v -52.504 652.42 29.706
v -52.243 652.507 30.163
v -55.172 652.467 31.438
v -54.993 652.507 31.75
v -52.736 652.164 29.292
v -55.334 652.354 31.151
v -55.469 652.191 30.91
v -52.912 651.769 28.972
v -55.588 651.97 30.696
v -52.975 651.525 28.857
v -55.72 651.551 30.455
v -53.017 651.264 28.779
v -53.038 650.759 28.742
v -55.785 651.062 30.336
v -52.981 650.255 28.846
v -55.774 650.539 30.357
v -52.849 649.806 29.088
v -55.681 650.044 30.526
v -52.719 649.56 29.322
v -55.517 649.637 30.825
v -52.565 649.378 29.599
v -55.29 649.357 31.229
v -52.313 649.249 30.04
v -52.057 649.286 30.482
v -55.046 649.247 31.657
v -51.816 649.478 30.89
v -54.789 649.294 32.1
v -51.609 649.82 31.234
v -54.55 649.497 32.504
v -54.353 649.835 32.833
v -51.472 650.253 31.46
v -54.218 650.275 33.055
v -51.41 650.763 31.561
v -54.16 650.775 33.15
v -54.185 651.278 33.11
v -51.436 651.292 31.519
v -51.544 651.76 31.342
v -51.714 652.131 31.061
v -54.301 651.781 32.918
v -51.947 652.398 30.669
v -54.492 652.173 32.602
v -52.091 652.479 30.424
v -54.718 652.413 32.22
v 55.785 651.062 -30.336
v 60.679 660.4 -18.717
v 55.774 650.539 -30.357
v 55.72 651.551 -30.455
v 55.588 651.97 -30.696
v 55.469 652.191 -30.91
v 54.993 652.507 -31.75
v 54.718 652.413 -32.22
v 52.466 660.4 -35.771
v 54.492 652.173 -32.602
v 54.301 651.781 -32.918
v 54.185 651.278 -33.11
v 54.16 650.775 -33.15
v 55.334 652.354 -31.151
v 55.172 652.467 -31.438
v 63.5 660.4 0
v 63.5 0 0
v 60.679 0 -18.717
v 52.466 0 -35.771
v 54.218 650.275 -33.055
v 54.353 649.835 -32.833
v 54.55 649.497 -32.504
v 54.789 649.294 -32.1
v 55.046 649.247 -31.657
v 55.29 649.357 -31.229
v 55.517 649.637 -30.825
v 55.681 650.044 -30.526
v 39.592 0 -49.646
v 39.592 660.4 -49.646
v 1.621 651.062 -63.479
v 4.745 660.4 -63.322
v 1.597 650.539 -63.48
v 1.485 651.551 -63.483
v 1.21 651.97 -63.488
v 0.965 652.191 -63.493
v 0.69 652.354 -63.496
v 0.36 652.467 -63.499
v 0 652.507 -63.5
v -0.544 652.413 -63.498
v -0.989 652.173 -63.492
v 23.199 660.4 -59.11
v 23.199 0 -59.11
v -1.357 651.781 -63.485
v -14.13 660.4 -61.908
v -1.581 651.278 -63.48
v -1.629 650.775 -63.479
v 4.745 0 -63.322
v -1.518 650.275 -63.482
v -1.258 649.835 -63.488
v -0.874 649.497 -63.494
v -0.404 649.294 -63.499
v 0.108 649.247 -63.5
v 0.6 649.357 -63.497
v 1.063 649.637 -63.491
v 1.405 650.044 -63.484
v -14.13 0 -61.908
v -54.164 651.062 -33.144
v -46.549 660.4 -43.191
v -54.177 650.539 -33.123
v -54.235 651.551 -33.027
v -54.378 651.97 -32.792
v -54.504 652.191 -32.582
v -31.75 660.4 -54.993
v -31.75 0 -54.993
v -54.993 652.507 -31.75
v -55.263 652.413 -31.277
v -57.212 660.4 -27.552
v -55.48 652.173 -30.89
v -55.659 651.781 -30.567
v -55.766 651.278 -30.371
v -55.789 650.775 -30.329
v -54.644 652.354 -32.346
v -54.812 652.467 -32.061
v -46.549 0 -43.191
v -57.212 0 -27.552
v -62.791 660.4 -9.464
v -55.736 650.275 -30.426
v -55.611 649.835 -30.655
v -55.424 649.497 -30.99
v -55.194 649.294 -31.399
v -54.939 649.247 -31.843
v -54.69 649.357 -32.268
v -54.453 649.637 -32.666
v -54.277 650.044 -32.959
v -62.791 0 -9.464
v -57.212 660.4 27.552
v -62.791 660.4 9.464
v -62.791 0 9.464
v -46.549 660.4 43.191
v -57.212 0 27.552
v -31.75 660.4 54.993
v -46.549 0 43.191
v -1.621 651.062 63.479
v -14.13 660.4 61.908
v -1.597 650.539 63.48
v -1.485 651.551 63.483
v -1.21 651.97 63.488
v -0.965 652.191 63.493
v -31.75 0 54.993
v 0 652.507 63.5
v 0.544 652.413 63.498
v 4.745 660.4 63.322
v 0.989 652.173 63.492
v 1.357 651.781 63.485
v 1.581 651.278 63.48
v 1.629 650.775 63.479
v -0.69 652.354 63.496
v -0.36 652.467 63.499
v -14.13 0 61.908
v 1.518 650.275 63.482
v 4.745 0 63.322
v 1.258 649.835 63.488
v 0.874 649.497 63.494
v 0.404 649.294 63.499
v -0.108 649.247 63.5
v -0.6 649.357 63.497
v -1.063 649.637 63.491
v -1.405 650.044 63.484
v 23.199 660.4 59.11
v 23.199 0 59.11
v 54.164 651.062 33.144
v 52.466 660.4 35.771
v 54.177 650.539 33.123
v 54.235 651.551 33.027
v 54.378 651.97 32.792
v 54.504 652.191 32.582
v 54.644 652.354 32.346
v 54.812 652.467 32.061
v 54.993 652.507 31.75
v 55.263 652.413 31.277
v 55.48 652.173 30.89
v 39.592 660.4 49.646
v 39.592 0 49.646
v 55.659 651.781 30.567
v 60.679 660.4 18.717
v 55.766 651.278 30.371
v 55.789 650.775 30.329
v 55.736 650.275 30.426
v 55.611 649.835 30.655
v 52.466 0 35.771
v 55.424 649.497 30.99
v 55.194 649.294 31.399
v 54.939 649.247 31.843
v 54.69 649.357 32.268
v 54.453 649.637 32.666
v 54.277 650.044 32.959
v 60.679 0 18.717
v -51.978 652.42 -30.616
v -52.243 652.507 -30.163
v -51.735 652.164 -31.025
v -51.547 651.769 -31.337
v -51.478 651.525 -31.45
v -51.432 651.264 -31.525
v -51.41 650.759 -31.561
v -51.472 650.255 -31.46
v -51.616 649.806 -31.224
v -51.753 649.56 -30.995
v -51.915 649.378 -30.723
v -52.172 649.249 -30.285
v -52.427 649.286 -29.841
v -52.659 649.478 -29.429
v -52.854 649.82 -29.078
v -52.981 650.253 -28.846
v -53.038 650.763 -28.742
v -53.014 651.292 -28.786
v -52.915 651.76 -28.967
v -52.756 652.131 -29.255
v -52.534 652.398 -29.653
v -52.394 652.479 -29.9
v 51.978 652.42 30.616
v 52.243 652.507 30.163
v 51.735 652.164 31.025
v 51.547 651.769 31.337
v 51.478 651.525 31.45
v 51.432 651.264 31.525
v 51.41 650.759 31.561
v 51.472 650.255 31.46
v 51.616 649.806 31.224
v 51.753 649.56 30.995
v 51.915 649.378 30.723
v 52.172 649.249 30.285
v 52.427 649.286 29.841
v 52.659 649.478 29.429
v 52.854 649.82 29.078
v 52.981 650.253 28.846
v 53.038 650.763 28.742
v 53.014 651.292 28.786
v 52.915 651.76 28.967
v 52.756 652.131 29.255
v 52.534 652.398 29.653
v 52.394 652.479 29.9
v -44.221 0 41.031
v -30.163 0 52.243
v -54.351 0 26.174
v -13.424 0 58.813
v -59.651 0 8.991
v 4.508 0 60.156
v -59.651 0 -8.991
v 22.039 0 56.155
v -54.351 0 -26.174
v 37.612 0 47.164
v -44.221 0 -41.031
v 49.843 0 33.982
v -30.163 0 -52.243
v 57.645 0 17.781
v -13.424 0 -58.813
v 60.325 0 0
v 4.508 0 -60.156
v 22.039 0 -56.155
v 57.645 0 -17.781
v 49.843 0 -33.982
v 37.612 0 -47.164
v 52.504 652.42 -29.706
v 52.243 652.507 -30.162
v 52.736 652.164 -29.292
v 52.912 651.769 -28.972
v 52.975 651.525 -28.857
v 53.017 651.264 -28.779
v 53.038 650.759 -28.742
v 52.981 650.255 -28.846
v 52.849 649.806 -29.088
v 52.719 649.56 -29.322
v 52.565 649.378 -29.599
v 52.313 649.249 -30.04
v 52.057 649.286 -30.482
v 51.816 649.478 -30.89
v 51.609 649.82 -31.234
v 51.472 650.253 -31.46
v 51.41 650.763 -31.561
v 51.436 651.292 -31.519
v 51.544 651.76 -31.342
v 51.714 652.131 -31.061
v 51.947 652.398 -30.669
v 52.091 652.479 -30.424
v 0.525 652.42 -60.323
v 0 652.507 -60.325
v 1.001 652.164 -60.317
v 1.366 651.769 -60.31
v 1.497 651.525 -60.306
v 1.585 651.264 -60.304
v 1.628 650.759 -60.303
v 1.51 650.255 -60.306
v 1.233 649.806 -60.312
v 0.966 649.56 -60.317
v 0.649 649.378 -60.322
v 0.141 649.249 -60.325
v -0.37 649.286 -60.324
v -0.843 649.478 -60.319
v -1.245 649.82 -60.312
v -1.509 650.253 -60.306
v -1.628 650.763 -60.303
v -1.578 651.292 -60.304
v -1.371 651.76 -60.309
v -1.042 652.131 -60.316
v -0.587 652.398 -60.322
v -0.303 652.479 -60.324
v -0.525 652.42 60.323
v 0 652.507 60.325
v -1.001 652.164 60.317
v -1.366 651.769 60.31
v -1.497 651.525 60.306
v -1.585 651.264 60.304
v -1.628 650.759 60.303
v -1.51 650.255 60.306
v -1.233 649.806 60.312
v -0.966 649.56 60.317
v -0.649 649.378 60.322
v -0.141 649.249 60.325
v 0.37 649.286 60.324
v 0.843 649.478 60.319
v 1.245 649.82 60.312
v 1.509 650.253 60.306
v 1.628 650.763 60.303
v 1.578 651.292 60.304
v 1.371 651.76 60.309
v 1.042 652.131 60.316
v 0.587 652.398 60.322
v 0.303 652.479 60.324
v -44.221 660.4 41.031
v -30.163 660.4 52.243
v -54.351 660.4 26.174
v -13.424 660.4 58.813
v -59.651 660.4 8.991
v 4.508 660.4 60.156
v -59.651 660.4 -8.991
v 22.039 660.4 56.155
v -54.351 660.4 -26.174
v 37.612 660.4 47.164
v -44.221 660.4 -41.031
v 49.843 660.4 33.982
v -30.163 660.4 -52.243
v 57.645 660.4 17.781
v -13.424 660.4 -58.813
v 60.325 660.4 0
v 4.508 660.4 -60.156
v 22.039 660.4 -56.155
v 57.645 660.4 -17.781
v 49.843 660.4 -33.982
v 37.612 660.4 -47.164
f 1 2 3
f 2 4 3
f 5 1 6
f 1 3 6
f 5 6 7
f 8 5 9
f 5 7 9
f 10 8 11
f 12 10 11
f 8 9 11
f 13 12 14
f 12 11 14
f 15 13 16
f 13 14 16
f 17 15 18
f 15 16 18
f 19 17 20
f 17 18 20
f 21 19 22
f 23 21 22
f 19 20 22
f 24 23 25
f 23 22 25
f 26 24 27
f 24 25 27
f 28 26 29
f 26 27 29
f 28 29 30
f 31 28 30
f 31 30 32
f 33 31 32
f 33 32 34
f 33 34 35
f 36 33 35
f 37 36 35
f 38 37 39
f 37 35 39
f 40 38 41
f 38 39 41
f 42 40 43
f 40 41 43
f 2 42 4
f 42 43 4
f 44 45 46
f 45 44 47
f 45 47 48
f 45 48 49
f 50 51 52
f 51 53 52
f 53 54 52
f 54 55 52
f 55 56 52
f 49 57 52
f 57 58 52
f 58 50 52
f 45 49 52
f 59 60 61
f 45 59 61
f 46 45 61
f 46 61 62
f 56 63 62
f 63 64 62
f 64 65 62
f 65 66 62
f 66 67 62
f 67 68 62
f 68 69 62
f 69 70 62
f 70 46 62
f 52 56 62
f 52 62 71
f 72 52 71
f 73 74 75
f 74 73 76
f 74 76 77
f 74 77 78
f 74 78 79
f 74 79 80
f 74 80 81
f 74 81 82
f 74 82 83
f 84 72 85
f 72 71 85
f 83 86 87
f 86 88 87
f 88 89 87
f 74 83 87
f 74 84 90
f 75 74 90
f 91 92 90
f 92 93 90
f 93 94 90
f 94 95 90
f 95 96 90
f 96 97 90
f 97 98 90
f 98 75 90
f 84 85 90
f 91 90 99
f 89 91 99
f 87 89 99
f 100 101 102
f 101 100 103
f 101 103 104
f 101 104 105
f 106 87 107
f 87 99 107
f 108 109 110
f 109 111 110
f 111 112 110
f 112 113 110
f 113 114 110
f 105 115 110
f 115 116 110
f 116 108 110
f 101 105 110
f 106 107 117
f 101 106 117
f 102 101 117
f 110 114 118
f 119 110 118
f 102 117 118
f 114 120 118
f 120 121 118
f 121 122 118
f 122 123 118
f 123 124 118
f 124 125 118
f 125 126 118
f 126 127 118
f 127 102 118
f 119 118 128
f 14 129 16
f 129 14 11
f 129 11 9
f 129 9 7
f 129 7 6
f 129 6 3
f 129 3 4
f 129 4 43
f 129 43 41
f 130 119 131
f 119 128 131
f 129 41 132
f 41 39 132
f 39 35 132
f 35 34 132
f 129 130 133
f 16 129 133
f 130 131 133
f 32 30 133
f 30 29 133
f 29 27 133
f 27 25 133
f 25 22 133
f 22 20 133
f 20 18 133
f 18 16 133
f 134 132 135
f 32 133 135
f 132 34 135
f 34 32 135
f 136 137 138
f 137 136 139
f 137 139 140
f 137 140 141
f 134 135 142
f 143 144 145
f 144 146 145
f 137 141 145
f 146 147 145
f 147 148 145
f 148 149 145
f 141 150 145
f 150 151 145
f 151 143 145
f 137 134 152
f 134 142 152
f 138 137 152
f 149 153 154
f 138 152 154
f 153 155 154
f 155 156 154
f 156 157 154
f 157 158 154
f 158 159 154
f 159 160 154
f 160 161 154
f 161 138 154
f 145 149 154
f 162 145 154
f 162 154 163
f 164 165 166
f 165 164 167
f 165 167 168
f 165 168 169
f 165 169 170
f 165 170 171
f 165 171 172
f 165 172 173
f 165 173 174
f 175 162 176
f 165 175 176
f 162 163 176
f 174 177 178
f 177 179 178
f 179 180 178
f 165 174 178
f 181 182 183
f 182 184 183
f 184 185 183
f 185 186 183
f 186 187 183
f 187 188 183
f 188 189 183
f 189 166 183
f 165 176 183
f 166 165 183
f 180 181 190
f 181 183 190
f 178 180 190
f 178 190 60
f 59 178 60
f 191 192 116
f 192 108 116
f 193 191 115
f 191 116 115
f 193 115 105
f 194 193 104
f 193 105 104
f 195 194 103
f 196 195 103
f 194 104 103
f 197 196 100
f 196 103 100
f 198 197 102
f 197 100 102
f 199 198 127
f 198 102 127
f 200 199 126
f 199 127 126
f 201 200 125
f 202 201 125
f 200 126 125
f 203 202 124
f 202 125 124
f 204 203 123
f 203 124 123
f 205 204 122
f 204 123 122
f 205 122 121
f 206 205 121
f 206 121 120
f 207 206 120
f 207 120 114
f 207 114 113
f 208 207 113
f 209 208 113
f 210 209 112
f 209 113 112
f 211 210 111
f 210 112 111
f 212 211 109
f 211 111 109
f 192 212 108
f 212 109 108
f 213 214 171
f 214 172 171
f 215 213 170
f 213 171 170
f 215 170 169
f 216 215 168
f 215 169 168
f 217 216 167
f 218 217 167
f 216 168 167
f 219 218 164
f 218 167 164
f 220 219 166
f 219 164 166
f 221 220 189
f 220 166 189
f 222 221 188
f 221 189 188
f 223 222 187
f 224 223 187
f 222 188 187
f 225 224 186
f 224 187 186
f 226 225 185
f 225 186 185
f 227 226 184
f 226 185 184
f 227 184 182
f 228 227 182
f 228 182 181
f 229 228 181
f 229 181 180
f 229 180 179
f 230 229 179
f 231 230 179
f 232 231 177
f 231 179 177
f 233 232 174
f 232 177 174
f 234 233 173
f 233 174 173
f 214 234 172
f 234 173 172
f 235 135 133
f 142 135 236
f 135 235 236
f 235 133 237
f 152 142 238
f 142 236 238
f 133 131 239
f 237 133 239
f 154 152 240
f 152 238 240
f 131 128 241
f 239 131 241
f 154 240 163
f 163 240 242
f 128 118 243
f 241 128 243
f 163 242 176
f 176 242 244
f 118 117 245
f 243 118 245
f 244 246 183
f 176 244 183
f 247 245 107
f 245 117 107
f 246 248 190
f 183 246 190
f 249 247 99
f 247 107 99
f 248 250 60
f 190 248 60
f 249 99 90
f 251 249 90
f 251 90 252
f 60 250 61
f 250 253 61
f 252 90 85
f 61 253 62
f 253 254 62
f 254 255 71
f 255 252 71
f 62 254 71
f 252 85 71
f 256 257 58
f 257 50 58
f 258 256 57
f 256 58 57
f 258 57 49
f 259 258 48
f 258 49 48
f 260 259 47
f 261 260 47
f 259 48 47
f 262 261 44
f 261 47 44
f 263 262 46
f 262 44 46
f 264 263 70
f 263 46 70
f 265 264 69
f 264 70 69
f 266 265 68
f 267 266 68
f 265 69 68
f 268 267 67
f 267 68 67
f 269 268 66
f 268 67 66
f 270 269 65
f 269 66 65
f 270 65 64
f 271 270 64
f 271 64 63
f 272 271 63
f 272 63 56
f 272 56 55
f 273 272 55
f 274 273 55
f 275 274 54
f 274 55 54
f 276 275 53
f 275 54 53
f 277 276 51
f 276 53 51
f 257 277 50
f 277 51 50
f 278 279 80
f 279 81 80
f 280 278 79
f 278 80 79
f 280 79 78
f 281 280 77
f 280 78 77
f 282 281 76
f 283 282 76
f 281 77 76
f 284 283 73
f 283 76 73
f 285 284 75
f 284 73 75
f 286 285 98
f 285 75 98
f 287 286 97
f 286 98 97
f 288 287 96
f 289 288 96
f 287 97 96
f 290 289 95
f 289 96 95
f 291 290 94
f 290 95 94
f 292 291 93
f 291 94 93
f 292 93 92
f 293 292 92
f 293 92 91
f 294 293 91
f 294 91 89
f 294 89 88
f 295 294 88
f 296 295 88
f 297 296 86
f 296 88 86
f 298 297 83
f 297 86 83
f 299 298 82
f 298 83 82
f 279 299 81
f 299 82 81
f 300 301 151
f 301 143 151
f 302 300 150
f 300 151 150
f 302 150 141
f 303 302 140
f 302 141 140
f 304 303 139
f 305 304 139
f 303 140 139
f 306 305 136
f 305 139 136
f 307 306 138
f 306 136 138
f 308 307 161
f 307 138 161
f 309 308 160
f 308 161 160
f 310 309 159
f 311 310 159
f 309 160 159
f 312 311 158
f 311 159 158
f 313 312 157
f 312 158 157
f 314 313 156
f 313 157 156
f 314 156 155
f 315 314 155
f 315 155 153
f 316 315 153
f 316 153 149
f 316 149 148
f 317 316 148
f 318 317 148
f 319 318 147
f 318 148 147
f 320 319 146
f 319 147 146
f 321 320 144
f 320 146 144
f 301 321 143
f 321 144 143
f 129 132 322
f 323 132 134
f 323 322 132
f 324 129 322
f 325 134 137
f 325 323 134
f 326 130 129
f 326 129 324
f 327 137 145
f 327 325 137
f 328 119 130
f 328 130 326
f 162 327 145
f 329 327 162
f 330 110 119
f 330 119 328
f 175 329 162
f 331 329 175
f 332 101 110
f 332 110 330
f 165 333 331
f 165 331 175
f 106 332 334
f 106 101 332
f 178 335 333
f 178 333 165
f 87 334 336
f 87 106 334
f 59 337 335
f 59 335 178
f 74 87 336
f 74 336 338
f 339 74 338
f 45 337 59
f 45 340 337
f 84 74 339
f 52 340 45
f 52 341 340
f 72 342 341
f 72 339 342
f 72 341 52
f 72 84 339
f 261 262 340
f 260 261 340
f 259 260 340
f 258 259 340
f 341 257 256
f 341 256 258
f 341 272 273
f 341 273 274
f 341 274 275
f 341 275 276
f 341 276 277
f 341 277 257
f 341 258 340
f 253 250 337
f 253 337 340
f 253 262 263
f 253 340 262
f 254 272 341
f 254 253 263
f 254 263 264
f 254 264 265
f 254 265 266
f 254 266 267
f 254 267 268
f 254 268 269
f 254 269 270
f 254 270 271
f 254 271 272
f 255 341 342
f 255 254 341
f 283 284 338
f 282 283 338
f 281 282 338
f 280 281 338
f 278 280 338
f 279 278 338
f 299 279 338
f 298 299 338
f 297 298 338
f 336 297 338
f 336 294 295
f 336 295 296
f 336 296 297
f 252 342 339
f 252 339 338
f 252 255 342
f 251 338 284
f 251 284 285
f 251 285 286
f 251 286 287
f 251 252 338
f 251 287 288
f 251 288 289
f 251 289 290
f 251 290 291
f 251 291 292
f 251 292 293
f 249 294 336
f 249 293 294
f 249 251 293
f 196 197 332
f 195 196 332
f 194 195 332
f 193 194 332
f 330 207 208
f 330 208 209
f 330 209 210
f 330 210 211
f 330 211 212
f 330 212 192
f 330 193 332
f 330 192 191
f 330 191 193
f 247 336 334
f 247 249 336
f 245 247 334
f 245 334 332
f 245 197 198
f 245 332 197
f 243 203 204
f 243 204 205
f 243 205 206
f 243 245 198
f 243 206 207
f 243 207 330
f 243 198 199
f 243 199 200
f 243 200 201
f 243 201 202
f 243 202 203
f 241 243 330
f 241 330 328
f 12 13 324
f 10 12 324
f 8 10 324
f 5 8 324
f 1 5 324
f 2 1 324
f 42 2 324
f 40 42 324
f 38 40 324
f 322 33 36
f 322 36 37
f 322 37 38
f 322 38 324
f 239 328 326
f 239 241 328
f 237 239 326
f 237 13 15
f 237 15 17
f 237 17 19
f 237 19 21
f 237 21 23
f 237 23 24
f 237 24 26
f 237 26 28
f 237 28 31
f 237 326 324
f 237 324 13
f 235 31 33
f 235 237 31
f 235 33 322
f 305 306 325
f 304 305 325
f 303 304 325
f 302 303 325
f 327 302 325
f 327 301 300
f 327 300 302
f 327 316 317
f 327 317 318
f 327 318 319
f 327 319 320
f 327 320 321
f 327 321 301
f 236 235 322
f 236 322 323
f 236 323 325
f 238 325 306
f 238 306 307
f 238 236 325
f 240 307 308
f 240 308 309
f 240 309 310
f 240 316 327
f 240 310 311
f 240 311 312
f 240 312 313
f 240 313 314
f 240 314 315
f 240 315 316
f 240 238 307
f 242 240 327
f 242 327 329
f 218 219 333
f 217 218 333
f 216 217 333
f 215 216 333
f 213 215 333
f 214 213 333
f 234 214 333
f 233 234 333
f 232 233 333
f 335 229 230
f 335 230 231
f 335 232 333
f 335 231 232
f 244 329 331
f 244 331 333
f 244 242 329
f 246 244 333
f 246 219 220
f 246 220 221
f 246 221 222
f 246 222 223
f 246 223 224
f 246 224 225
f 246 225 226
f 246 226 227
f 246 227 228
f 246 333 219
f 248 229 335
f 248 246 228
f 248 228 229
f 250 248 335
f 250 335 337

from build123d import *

# Parameters (mm, degrees)
SKETCH1_R           = 63.5
SKETCH1_R_2         = 60.325
BOSS_EXTRUDE1_DEPTH = 660.4
SKETCH4_W           = 1.63195
SKETCH4_H           = 63.5
CIRPATTERN1_COUNT   = 6


with BuildPart() as part:
    # Sketch1 → Boss-Extrude1 (new body)
    with BuildSketch(Plane(origin=(0, 0, 0), x_dir=(1, 0, 0), z_dir=(0, 1, 0))):
        Circle(SKETCH1_R)
        Circle(SKETCH1_R_2, mode=Mode.SUBTRACT)
    extrude(amount=BOSS_EXTRUDE1_DEPTH)

    # Sketch4 → #4 Clearance Hole2 (revolve, cut)
    with BuildSketch(Plane(origin=(0, 650.875, 0), x_dir=(0, 1, 0), z_dir=(1, 0, 0))):
        with Locations((0.815975, 31.75)):
            Rectangle(SKETCH4_W, SKETCH4_H)
    f_4_clearance_hole2 = revolve(axis=Axis((0, 650.875, -6.35), (0, 0, 1)), mode=Mode.SUBTRACT)

    # CirPattern1: #4 Clearance Hole2 ×6 about axis
    cirpattern1_axis = Axis((0, 660.4, 0), (0, 1, 0))
    for i in range(1, CIRPATTERN1_COUNT):
        add(f_4_clearance_hole2.rotate(cirpattern1_axis, i * 360 / CIRPATTERN1_COUNT), mode=Mode.SUBTRACT)


solid = part.part
